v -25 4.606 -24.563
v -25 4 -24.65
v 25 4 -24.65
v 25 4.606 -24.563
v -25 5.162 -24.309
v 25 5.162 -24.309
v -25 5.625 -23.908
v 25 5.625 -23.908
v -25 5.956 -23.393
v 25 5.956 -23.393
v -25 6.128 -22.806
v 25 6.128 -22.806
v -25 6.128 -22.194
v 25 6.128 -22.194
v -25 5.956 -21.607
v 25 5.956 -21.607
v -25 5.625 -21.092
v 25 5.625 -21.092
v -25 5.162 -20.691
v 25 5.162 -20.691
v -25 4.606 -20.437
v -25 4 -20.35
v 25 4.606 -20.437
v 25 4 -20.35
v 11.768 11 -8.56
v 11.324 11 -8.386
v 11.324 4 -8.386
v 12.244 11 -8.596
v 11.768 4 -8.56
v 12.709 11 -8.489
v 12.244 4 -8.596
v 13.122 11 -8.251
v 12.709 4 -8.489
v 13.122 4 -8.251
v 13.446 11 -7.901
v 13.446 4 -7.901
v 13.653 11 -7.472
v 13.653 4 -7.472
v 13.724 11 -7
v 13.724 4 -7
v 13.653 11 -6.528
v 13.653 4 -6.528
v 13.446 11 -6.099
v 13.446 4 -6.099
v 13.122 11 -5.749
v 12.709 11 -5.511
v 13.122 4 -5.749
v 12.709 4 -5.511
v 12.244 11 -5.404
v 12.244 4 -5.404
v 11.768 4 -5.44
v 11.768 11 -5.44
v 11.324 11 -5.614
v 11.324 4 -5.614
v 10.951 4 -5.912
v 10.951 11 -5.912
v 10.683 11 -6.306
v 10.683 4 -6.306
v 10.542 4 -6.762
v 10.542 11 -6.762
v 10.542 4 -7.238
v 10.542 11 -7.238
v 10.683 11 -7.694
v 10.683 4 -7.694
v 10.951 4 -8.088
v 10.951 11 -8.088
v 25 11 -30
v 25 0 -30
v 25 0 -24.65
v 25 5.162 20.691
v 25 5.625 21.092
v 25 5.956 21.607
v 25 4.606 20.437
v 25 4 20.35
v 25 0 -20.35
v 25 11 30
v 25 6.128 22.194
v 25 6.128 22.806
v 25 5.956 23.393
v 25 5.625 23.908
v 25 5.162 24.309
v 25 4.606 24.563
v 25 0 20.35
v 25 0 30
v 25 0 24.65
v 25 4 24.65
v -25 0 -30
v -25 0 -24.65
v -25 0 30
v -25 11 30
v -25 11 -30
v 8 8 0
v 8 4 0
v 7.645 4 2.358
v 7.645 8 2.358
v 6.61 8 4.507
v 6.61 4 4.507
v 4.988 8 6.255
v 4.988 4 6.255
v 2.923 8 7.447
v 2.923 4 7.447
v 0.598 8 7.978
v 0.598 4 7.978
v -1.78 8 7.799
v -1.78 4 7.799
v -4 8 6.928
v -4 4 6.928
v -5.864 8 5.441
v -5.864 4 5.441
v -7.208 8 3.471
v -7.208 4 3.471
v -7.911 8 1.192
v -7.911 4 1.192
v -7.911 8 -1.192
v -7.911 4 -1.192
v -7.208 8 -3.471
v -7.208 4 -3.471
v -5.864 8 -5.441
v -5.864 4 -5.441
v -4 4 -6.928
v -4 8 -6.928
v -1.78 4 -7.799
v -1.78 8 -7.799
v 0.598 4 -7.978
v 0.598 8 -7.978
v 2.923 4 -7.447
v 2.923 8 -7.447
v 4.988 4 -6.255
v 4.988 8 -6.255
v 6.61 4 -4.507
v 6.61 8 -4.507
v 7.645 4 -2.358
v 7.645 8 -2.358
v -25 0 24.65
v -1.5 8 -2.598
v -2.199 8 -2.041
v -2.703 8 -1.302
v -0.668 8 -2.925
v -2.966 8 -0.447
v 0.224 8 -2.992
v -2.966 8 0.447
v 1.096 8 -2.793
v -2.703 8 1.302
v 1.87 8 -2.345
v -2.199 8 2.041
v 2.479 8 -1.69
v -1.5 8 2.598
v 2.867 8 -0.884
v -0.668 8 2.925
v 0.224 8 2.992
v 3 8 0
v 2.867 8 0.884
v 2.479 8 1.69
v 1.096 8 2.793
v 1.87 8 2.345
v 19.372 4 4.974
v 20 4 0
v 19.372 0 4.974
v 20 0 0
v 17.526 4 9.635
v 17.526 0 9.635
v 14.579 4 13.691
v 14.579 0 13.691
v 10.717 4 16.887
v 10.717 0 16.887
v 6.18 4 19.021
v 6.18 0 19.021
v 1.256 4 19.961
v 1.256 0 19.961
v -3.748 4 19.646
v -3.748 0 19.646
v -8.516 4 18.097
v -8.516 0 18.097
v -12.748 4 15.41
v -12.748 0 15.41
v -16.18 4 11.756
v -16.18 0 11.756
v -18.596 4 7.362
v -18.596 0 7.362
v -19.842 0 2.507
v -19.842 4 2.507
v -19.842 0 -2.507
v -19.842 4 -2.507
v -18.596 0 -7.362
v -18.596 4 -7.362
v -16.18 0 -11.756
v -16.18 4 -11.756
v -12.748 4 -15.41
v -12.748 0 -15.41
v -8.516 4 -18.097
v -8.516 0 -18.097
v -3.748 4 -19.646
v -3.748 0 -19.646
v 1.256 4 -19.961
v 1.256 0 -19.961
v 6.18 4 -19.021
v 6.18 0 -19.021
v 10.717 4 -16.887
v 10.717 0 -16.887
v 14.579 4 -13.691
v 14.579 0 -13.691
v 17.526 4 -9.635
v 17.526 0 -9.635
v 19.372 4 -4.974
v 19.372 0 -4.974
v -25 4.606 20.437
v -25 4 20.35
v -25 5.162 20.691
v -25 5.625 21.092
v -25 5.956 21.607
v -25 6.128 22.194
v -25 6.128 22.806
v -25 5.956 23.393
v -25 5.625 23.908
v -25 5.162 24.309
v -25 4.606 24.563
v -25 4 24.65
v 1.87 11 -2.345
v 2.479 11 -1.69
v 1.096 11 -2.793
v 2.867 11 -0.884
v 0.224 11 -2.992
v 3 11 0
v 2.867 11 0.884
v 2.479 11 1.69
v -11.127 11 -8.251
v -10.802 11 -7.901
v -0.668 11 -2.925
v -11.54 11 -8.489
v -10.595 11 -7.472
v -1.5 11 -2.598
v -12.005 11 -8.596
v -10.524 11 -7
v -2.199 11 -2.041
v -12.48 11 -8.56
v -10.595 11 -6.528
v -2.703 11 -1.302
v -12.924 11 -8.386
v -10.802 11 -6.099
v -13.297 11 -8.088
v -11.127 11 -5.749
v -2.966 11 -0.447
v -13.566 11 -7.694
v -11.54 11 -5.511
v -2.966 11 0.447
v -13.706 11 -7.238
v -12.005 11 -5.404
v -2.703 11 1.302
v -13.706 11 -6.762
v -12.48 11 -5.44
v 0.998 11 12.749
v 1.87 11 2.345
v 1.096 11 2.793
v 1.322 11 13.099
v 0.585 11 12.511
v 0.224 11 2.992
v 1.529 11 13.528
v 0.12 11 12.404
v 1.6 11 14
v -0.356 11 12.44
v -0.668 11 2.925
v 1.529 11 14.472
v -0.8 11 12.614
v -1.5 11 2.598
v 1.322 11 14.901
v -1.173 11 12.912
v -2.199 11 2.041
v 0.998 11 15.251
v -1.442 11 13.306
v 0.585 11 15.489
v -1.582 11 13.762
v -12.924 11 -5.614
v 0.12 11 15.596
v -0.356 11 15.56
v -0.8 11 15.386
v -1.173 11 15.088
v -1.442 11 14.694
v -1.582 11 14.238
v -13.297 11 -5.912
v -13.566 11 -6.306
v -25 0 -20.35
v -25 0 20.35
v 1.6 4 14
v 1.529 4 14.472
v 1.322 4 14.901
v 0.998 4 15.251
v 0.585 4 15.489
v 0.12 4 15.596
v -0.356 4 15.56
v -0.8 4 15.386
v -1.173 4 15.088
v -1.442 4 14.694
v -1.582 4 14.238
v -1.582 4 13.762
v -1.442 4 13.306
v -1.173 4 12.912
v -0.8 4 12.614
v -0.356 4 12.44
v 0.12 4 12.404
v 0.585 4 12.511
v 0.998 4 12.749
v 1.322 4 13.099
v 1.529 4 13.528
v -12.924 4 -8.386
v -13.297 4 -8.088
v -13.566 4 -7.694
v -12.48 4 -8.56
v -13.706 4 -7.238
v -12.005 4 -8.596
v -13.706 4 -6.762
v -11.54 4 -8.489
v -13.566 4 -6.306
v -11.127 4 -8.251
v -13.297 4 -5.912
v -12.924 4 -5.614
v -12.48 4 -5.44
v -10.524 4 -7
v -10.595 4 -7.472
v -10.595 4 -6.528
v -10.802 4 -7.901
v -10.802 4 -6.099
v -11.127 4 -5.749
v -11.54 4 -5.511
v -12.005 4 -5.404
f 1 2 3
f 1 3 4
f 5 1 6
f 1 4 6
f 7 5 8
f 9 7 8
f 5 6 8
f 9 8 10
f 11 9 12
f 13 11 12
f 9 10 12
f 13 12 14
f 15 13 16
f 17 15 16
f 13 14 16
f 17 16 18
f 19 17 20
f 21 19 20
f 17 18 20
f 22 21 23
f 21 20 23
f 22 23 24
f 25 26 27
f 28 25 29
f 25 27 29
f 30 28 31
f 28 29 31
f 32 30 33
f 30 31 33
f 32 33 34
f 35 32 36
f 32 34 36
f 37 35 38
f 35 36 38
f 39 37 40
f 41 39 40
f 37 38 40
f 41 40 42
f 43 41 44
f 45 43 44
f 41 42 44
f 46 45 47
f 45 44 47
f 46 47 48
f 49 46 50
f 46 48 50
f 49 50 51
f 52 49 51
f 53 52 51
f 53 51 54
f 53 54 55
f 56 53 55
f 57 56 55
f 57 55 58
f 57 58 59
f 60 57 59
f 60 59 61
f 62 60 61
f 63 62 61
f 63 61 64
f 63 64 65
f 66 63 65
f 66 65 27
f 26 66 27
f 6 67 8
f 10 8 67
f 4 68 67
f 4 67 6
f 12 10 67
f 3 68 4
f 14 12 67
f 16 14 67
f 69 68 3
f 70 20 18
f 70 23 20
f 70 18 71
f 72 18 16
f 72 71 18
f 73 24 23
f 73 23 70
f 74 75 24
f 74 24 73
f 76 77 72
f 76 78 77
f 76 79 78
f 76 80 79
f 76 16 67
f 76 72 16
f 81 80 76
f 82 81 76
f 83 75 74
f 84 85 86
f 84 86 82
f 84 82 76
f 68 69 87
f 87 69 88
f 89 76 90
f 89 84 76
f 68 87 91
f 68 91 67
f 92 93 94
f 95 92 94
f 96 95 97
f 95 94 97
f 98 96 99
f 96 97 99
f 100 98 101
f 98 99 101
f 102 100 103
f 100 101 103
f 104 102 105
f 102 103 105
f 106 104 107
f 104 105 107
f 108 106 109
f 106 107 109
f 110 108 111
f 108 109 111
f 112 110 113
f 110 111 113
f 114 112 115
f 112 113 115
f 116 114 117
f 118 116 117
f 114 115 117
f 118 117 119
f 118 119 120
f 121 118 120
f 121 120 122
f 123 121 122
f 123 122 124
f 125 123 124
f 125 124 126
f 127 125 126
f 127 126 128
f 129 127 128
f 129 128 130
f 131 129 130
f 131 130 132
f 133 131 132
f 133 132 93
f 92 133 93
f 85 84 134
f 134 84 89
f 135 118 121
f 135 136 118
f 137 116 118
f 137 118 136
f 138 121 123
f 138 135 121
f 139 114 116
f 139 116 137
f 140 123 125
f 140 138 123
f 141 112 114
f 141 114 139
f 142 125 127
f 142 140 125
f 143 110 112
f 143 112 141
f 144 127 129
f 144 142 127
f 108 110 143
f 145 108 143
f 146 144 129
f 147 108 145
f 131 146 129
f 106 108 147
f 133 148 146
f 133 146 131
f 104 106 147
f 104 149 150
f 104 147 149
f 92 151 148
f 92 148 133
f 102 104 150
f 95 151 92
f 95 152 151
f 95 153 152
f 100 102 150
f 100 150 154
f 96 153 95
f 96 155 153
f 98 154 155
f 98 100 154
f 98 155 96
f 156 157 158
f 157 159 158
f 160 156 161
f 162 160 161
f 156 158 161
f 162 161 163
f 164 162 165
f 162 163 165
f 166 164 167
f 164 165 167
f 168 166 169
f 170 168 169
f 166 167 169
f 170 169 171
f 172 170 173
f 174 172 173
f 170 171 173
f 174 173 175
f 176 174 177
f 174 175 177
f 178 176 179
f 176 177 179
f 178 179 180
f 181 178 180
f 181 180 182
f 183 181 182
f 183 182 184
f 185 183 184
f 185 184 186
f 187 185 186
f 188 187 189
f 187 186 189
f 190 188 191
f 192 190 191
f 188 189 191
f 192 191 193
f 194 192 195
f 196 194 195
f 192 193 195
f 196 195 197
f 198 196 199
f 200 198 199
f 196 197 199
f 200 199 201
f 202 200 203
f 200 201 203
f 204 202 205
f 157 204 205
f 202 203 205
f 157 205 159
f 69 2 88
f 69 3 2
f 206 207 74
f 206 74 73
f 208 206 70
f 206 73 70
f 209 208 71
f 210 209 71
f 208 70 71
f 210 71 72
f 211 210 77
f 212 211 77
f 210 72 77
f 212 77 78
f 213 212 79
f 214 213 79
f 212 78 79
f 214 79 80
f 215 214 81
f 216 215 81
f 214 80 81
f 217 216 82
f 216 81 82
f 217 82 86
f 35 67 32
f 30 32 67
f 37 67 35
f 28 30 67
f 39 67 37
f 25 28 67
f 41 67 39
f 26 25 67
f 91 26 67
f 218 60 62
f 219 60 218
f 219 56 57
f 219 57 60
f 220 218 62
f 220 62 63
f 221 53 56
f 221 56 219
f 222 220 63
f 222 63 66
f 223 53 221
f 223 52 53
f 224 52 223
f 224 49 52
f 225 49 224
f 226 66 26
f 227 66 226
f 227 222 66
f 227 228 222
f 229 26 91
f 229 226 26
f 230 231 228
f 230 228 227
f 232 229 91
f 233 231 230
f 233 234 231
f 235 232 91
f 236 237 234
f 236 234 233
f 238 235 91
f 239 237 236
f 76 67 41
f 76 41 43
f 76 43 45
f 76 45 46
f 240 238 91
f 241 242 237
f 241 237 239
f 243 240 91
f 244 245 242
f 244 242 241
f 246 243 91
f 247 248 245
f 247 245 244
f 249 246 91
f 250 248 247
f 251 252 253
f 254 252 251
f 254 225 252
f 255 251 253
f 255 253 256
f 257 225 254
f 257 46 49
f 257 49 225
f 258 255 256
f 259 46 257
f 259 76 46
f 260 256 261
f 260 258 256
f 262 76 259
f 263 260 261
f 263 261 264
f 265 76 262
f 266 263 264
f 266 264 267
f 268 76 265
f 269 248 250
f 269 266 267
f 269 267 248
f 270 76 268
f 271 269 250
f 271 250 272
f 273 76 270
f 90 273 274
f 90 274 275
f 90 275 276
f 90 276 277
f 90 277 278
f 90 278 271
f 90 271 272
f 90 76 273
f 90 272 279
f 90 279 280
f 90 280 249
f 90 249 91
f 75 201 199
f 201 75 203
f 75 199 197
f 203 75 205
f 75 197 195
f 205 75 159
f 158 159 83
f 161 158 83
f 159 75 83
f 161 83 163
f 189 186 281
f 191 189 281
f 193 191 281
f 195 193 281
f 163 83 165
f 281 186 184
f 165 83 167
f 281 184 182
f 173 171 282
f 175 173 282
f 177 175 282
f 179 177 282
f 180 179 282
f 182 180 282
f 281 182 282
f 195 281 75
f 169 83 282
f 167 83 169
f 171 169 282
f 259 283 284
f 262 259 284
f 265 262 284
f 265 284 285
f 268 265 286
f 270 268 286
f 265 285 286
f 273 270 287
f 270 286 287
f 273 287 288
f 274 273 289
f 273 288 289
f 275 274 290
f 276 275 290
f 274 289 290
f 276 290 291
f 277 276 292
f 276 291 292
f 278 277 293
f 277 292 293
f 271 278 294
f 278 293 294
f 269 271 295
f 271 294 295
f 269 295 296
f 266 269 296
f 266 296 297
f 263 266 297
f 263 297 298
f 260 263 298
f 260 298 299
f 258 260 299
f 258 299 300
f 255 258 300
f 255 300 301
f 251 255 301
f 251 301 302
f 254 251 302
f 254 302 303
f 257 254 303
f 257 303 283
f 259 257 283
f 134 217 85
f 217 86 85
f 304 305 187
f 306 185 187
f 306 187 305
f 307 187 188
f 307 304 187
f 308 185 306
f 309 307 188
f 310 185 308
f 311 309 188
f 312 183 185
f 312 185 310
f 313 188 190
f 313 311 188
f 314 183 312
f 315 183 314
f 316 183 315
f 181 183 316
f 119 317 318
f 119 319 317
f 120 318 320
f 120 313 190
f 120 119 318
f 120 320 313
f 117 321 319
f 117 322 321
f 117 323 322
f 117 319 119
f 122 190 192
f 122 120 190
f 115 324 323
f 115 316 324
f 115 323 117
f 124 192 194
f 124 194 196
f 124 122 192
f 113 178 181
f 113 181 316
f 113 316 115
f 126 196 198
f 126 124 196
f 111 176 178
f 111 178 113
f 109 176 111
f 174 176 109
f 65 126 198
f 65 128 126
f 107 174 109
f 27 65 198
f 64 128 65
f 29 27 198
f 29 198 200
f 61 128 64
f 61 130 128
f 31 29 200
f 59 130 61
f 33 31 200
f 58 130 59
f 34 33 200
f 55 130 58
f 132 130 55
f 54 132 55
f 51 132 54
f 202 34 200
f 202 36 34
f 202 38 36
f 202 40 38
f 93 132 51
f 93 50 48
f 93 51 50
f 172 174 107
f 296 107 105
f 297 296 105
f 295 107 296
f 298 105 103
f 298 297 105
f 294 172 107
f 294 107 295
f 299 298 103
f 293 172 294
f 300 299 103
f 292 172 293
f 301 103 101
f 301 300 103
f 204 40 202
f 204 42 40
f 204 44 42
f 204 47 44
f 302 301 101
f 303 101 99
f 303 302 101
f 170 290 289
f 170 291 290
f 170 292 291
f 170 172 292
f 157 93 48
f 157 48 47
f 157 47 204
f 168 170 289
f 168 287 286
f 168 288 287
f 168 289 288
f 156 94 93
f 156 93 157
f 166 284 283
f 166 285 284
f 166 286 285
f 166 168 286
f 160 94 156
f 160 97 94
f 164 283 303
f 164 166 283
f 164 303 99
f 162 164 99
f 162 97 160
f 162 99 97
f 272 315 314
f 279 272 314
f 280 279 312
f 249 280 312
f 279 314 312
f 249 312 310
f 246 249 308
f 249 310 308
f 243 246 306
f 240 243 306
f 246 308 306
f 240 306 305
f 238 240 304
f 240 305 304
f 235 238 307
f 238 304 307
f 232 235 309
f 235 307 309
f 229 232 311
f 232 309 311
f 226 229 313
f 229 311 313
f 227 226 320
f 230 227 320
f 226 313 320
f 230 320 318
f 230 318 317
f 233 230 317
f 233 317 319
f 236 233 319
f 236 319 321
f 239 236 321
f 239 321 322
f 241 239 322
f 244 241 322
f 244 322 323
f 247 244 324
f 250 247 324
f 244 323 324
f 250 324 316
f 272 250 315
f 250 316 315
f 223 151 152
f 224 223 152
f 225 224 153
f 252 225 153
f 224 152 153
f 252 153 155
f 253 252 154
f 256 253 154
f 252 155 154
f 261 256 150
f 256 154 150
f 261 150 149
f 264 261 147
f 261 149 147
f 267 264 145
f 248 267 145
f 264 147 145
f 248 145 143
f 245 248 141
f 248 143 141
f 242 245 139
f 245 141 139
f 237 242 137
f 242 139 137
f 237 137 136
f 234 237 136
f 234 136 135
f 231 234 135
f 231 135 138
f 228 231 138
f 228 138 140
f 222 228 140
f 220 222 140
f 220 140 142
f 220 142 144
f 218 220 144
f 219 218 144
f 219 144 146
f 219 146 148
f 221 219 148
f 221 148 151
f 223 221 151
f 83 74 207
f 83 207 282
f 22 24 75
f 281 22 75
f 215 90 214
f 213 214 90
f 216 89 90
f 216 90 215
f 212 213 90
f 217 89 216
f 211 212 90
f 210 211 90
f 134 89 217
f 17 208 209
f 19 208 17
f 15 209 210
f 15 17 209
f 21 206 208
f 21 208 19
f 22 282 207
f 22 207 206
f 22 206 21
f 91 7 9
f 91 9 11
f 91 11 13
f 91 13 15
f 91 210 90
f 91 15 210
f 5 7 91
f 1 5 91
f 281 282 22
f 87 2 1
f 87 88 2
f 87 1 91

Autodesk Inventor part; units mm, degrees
ref_plane "YZ Plane" through (0, 0, 0) normal (1, 0, 0) x (0, 1, 0)
ref_plane "XZ Plane" through (0, 0, 0) normal (0, 1, 0) x (-1, 0, 0)
ref_plane "XY Plane" through (0, 0, 0) normal (0, 0, 1) x (1, 0, 0)
sketch "Esquisse2" plane through (0, 0, 0) normal (0, 1, 0) x (-1, 0, 0)
  line L0 (25, -30) -> (-25, -30)
  line L1 (-25, -30) -> (-25, 30)
  line L2 (-25, 30) -> (25, 30)
  line L3 (25, 30) -> (25, -30)
  point P0 (0, 0)
  dimension "d0" = 50
  dimension "d1" = 60
  dimension "d2" = 25
  dimension "d3" = 30
extrude "Extrusion1" add sketch "Esquisse2" along normal blind 11
sketch "Esquisse3" plane through (25, 0, 30) normal (1, 0, 0) x (0, 0, -1)
  line L0 (60, 0) -> (0, 0) projected
  line L1 (60, 0) -> (60, 11) projected
  line L2 (0, 0) -> (0, 11) projected
  circle A0 centre (7.5, 4) radius 2.15
  circle A1 centre (52.5, 4) radius 2.15
  line L3 (5.35, 4) -> (5.35, 0)
  line L4 (9.65, 4) -> (9.65, 0)
  line L5 (9.65, 0) -> (5.35, 0)
  line L6 (50.35, 4) -> (50.35, 0)
  line L7 (54.65, 4) -> (54.65, 0)
  line L8 (54.65, 0) -> (50.35, 0)
  point P0 (30, 0)
  dimension "d6" = 4.3
  dimension "d7" = 4.3
  dimension "d8" = 45
  dimension "d9" = 7.5
  dimension "d10" = 7.5
  dimension "d11" = 60
  dimension "d12" = 4
extrude "Extrusion2" cut sketch "Esquisse3" against normal through all
sketch "Esquisse4" plane through (0, 0, 0) normal (0, -1, 0) x (1, 0, 0)
  circle A0 centre (0, 0) radius 20
  dimension "d15" = 40
extrude "Extrusion3" cut sketch "Esquisse4" against normal blind 4
sketch "Esquisse5" plane through (0, 4, 0) normal (0, -1, 0) x (1, 0, 0)
  circle A0 centre (0, 0) radius 20 projected
  circle A1 centre (0, 0) radius 8
  point P0 (8.7559, 17.9815)
  point P1 (8.7559, -17.9815)
  dimension "d18" = 16
extrude "Extrusion4" cut sketch "Esquisse5" against normal blind 4 contours A1
sketch "Esquisse7" plane through (0, 8, 0) normal (0, -1, 0) x (1, 0, 0)
  circle A0 centre (0, 0) radius 8 projected
  circle A1 centre (0, 0) radius 3
  dimension "d24" = 6
extrude "Extrusion6" cut sketch "Esquisse7" against normal through all contours A1
sketch "Esquisse8" plane through (0, 4, 0) normal (0, -1, 0) x (1, 0, 0)
  circle A0 centre (0, 0) radius 8 projected
  circle A1 centre (0, 14) radius 1.6
  dimension "d27" = 3.2
  dimension "d28" = 14
extrude "Extrusion7" cut sketch "Esquisse8" against normal through all contours A1
pattern_circular "Réseau circulaire1" count 3 over 360 about axis through (0, 4, 0) along (0, 1, 0) of "Extrusion7"
equation "\"d2\" = 0.5 * d0"
equation "\"d3\" = 0.5 * d1"
equation "\"d9\" = d10"
equation "\"d10\" = -0.5 * d8 + 0.5 * d11"
properties part number "Fixation_moteur" material "Plastique ABS"
